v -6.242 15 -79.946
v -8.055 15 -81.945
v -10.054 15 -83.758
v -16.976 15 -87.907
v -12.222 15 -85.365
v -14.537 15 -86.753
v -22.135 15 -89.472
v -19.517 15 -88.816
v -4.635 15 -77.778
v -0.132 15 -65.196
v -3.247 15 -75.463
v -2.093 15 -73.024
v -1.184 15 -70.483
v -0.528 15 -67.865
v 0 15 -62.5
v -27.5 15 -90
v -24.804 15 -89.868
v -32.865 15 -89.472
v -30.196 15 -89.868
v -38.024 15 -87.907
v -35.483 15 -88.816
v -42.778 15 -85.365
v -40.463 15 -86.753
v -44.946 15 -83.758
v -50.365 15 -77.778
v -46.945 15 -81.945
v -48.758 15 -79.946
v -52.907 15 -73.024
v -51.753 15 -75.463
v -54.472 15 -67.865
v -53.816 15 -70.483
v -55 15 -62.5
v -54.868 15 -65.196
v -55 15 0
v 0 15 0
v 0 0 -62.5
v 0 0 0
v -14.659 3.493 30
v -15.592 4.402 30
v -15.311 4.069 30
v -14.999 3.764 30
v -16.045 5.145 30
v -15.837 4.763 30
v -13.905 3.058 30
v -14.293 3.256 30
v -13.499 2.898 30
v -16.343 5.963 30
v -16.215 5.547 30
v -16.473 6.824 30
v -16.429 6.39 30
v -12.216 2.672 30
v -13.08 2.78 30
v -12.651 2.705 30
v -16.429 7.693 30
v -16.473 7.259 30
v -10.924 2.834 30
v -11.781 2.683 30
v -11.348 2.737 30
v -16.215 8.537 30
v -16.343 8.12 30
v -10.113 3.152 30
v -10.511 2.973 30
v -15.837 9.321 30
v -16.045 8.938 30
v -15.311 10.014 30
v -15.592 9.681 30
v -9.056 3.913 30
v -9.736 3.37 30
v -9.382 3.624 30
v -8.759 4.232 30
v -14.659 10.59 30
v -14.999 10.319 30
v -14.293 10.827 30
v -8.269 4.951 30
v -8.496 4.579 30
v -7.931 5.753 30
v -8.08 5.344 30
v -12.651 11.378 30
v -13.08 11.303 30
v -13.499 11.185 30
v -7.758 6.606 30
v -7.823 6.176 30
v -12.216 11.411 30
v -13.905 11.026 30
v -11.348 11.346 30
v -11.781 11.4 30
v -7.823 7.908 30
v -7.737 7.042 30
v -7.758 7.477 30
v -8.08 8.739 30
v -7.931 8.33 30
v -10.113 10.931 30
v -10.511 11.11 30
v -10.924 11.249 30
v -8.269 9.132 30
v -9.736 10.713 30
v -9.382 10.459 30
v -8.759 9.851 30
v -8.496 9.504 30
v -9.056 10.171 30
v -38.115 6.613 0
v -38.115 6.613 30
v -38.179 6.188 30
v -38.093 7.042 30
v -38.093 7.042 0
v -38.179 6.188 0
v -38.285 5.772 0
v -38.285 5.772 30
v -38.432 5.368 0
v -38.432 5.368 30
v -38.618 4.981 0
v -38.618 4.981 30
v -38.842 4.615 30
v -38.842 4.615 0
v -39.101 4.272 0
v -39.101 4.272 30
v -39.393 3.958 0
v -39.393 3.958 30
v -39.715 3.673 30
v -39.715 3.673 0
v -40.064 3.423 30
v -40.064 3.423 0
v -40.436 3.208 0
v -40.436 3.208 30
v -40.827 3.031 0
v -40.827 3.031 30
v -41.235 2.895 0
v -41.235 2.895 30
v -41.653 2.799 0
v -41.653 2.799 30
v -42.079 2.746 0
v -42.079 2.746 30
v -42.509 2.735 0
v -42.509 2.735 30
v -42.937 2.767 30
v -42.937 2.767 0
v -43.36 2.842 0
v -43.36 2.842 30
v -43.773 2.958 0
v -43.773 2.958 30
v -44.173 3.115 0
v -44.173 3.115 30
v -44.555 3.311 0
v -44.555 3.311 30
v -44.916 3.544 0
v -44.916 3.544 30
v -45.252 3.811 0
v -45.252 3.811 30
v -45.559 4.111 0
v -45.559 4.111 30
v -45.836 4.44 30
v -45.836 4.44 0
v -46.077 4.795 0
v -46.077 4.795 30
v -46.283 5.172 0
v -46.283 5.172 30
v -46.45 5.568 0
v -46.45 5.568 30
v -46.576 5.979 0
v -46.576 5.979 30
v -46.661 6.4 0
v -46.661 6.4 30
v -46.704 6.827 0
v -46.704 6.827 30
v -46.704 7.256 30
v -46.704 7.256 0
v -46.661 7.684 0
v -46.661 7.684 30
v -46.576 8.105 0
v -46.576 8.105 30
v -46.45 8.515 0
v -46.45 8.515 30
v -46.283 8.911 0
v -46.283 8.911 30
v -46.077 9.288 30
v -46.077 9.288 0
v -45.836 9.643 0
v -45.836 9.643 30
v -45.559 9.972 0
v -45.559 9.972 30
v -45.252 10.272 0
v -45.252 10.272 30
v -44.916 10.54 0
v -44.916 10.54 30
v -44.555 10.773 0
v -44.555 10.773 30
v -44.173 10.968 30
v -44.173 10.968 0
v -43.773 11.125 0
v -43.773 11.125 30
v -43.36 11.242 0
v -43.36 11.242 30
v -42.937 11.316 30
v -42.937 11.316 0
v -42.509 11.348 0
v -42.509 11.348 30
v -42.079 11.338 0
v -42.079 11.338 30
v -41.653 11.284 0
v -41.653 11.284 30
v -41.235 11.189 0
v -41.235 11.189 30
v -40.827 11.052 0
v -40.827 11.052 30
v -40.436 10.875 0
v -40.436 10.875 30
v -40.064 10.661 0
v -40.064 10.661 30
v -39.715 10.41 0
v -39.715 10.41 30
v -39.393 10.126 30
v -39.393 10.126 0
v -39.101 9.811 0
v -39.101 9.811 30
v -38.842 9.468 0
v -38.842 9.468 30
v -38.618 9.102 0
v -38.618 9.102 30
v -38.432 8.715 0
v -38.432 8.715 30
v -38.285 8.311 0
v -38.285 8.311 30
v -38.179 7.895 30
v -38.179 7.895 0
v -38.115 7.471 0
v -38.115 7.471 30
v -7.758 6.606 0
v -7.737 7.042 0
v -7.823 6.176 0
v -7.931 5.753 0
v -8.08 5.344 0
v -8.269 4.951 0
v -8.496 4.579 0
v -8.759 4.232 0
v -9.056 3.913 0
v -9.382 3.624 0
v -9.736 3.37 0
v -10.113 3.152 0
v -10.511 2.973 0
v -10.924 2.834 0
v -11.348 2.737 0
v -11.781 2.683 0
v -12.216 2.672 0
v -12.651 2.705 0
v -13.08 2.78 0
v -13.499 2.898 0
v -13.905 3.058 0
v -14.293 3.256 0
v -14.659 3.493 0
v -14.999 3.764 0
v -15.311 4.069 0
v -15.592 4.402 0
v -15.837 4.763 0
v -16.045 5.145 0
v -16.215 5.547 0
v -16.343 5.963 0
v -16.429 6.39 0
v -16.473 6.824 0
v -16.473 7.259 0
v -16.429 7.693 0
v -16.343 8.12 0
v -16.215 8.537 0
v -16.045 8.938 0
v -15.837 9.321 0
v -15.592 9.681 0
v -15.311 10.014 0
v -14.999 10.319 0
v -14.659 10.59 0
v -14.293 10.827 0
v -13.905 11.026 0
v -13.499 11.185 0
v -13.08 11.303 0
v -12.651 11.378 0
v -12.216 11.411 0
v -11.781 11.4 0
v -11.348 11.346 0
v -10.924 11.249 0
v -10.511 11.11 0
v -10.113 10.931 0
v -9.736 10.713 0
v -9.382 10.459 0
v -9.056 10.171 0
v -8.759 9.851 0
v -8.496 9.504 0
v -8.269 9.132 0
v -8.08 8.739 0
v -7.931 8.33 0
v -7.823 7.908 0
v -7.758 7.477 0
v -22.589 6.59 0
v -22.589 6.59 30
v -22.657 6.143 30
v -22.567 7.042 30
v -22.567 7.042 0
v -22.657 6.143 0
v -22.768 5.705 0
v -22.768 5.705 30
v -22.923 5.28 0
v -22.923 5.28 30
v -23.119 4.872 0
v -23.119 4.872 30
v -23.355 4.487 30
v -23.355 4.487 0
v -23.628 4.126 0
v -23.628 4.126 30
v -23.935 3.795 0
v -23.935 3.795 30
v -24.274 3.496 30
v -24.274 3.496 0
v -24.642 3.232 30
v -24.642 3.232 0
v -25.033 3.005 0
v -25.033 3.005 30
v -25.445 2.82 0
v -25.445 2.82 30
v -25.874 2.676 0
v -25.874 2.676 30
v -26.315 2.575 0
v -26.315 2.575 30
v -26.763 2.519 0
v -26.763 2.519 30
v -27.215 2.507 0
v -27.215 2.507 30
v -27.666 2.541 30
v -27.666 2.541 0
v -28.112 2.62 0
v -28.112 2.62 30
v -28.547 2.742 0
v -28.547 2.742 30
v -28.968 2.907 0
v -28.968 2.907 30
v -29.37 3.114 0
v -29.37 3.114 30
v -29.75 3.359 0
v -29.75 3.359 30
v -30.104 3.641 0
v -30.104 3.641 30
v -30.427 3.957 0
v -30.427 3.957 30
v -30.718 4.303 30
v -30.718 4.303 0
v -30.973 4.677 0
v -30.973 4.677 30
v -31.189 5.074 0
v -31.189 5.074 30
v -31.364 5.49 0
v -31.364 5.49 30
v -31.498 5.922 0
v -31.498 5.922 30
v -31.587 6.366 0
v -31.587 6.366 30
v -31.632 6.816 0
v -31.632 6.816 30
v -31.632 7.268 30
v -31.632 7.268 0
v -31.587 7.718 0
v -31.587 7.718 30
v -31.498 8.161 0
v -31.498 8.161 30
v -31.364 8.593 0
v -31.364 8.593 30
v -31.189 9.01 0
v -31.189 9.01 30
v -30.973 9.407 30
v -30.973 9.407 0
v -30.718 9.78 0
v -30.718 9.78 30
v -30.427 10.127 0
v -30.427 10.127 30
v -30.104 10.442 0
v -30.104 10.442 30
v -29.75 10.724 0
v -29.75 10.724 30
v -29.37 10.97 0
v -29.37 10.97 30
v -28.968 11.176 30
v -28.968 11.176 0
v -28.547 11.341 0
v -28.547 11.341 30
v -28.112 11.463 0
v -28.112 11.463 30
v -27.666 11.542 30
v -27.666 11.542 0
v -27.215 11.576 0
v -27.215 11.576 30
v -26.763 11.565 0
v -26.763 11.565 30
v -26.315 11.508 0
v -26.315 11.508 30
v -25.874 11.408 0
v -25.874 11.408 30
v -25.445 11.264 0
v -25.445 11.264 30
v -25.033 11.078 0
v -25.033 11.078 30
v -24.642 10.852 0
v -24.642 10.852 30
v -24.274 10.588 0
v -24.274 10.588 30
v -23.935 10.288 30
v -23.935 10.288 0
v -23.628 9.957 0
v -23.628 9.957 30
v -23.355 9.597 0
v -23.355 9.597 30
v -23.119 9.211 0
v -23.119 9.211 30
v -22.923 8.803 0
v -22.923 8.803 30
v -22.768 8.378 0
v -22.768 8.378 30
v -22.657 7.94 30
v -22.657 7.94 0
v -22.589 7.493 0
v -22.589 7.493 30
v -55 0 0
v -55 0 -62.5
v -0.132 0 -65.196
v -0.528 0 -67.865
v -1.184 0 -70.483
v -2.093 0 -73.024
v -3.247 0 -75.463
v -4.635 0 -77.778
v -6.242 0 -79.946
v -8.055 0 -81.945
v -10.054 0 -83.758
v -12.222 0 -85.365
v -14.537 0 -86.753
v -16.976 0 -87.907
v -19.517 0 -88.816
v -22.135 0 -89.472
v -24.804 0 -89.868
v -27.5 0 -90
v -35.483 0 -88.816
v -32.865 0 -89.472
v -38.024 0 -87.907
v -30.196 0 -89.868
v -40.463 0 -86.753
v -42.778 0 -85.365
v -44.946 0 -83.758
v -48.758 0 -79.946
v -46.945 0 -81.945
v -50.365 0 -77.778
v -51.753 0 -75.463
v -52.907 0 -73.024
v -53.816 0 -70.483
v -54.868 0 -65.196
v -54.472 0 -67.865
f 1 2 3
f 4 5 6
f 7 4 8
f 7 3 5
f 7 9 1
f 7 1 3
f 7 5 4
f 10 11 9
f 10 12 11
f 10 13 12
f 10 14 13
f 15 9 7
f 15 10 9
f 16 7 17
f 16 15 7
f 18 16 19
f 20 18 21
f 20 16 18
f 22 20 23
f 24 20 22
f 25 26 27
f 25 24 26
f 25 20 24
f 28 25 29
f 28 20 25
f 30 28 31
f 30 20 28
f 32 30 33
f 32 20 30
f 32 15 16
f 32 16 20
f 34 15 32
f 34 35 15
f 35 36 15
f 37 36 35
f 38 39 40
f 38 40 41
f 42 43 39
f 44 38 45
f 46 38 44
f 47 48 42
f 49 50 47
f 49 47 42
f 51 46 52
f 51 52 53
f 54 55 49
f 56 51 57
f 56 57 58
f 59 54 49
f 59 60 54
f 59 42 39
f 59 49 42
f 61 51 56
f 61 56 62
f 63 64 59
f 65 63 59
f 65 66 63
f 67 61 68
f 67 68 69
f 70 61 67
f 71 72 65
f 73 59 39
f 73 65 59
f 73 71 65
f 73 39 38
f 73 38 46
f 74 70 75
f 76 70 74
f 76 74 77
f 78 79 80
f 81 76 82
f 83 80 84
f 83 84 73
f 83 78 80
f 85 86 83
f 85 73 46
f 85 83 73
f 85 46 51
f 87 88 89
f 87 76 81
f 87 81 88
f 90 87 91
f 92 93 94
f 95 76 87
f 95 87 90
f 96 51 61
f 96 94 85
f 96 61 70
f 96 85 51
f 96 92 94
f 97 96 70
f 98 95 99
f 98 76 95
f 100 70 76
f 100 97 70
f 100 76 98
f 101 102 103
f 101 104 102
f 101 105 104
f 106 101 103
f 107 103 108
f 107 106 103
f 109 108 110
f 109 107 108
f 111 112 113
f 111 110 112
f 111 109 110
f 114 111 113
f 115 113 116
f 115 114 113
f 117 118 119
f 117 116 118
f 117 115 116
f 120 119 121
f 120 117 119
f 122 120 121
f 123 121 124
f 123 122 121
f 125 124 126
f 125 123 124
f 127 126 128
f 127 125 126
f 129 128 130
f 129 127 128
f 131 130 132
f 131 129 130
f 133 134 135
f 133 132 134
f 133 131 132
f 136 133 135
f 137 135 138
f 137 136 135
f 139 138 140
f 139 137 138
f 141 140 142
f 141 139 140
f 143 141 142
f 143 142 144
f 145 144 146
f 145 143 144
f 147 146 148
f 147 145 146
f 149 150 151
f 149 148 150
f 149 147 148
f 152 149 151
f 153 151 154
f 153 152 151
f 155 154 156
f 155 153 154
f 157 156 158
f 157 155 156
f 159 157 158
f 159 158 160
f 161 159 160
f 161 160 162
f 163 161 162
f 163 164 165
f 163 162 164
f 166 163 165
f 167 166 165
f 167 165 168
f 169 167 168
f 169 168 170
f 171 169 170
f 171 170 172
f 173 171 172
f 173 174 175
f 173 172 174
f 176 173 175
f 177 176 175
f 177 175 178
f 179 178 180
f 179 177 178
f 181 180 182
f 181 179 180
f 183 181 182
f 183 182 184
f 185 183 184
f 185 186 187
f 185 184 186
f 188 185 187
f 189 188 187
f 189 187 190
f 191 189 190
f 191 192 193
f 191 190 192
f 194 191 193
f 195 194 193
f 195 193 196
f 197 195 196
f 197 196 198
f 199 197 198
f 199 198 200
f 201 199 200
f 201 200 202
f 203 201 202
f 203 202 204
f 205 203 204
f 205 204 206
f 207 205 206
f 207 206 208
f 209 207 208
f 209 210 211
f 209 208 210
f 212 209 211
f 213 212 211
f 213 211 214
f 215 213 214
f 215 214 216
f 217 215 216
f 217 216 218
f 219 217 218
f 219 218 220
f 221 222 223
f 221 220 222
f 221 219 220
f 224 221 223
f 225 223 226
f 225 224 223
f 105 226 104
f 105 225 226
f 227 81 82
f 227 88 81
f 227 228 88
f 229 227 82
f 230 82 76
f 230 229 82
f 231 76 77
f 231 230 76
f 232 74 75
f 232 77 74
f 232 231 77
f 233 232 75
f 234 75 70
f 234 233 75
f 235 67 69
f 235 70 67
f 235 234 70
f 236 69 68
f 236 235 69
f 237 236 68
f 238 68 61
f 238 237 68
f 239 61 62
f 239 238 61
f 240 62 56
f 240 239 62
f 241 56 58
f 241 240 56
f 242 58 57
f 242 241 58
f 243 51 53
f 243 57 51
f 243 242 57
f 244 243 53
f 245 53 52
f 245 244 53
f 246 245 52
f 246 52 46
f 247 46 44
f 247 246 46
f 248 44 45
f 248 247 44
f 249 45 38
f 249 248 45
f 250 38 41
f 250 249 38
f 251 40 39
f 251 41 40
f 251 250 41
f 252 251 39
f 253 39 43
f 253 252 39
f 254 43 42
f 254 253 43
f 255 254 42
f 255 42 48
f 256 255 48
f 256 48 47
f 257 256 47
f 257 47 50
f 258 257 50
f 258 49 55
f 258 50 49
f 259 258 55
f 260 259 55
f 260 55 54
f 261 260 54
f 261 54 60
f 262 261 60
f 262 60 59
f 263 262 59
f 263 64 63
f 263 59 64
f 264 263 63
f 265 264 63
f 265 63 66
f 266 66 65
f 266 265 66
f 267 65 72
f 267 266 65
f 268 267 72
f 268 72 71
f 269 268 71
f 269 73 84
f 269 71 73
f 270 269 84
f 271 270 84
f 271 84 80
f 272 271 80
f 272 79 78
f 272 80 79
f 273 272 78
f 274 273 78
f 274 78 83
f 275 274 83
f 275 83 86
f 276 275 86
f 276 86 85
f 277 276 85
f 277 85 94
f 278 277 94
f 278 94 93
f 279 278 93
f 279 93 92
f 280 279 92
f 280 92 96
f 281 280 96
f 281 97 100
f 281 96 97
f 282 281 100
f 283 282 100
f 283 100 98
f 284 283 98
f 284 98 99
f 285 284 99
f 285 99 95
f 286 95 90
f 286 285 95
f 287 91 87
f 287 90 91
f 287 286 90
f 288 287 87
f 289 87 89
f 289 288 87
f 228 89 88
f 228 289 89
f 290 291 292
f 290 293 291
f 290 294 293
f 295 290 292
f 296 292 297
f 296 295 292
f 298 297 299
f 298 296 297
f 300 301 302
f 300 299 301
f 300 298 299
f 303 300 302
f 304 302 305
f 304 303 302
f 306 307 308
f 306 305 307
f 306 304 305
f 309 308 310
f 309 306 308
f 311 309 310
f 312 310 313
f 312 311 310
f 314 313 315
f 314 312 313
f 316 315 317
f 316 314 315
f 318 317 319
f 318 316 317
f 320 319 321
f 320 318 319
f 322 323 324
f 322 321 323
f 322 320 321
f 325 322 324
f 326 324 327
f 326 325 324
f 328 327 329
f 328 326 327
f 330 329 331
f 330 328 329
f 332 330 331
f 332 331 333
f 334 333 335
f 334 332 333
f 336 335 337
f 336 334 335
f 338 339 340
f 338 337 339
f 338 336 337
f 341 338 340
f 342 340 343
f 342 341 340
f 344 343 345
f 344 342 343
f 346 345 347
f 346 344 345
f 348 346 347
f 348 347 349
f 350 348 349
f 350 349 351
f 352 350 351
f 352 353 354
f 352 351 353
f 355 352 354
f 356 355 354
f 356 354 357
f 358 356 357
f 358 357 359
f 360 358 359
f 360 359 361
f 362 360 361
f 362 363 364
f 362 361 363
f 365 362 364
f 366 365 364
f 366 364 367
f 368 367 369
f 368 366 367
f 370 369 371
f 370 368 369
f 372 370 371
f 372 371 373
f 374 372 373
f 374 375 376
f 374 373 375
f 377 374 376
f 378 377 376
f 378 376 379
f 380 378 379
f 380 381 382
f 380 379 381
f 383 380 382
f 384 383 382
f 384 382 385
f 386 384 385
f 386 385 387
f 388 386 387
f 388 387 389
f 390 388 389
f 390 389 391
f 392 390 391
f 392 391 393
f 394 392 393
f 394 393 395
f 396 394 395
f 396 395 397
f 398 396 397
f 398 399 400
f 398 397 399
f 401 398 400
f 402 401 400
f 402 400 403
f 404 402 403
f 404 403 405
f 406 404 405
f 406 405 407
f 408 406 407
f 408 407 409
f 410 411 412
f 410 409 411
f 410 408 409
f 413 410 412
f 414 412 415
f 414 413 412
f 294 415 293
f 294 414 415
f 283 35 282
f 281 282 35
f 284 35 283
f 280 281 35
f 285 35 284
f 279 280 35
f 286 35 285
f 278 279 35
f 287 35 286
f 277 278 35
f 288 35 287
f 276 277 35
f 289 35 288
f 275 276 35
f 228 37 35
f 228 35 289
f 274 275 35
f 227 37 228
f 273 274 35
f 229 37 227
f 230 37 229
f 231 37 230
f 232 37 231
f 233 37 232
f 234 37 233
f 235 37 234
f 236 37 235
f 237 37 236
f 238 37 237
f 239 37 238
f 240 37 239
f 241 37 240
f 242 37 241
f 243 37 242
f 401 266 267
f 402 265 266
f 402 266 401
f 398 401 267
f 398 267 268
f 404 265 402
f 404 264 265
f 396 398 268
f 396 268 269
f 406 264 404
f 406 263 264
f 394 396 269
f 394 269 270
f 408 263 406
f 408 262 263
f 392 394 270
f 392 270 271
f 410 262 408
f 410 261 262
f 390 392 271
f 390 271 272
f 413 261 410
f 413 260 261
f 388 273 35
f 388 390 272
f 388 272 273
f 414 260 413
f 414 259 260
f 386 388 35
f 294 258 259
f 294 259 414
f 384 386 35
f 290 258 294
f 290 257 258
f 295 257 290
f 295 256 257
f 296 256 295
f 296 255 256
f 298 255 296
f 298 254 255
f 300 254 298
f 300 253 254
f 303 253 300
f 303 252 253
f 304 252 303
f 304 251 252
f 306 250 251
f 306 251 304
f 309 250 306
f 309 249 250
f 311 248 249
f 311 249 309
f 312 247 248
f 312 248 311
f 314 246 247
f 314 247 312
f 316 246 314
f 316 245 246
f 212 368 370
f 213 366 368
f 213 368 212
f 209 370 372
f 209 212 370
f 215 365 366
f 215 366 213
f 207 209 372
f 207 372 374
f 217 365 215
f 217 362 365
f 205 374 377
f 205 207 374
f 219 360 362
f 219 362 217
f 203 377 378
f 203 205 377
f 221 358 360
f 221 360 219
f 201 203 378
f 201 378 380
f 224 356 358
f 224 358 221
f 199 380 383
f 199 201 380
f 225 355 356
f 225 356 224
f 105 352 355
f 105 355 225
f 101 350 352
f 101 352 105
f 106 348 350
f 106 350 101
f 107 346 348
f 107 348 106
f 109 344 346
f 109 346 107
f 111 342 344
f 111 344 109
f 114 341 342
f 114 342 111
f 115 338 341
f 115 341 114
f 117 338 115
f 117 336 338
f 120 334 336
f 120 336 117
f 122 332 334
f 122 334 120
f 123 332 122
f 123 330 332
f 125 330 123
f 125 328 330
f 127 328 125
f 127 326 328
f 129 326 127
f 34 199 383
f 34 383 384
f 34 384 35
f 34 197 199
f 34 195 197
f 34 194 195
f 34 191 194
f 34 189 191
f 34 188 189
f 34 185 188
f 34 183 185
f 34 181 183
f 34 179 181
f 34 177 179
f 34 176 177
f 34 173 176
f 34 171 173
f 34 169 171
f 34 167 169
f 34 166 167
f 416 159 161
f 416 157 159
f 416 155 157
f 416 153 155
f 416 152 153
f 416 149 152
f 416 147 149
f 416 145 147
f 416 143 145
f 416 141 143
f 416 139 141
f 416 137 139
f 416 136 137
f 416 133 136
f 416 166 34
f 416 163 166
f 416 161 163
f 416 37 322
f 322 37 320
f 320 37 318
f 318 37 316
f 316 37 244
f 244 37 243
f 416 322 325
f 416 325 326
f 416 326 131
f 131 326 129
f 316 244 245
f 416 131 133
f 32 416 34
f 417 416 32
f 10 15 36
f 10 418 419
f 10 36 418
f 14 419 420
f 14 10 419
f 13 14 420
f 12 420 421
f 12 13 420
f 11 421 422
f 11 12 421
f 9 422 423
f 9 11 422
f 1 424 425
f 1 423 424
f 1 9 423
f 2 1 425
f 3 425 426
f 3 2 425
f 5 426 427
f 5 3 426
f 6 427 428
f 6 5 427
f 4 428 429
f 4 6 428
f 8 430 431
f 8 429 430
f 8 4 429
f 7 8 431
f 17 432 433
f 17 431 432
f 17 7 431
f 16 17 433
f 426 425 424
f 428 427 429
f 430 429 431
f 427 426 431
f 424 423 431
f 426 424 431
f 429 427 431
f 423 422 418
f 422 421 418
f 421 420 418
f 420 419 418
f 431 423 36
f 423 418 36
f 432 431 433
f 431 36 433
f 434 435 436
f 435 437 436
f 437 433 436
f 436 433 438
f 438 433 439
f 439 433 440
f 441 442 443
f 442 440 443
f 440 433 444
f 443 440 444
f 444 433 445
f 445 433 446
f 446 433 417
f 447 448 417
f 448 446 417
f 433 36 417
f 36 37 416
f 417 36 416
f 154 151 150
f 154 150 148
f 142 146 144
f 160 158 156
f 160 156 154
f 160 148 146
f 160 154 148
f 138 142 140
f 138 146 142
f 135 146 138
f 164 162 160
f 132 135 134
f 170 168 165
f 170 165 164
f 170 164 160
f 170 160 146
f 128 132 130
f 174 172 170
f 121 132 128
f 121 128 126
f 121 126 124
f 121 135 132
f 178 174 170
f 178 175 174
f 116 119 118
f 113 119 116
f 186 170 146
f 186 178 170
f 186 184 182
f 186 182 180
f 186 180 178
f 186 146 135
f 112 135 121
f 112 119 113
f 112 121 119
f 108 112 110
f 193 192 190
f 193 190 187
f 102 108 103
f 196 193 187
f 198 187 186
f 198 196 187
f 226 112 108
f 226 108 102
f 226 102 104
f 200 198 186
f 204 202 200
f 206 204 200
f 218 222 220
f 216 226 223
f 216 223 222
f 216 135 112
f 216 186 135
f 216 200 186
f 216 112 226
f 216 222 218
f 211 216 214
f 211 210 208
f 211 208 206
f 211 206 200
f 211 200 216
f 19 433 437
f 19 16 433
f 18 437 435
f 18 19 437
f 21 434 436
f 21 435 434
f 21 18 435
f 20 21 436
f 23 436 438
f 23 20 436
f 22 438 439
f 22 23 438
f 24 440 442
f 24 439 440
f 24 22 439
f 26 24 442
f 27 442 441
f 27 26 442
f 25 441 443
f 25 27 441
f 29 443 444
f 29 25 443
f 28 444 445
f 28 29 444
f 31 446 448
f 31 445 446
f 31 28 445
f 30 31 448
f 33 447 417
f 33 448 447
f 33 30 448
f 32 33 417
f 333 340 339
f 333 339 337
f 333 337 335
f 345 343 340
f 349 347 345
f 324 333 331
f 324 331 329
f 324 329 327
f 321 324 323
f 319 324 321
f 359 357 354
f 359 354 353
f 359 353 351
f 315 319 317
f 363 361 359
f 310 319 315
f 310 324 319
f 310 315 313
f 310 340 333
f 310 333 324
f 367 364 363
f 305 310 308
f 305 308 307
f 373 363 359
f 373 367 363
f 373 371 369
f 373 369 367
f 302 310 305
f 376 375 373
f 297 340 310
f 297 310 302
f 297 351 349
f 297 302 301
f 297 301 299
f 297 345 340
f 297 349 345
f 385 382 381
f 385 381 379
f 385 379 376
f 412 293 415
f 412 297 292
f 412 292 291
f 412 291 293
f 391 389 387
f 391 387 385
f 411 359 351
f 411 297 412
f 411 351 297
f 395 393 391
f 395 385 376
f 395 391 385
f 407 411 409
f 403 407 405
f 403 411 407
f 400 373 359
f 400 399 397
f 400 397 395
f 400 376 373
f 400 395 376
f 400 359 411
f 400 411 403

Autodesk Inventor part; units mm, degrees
ref_plane "YZ Plane" through (0, 0, 0) normal (1, 0, 0) x (0, 1, 0)
ref_plane "XZ Plane" through (0, 0, 0) normal (0, 1, 0) x (-1, 0, 0)
ref_plane "XY Plane" through (0, 0, 0) normal (0, 0, 1) x (1, 0, 0)
sketch "Sketch1" plane through (0, 0, 0) normal (0, 1, 0) x (-1, 0, 0)
  line L0 (0, 0) -> (55, 0)
  line L1 (55, 0) -> (55, -90)
  line L2 (55, -90) -> (0, -90)
  line L3 (0, -90) -> (0, 0)
  dimension "d0" = 90
  dimension "d1" = 55
extrude "Extrusion1" add sketch "Sketch1" along normal blind 15
full round fillet "Fillet1" first side at (0, 5, -30) centre faces at (-18.3333, 5, -90) second side at (-55, 5, -60)
sketch "Sketch2" plane through (-55, 0, 0) normal (0, 0, 1) x (1, 0, 0)
  circle A0 centre (12.5986, 7.0416) radius 4.3081
  circle A1 centre (27.8976, 7.0416) radius 4.5356
  circle A2 centre (42.8926, 7.0416) radius 4.3708
  point P0 (55, 0)
extrude "Extrusion2" add sketch "Sketch2" along normal blind 30
sketch "Sketch3" plane through (0, 15, 0) normal (0, 1, 0) x (1, 0, 0)
  line L0 (-48.594, 65.8616) -> (-7.6272, 65.8616) construction
  line L1 (-7.6272, 65.8616) -> (-7.6272, 56.4823) construction
  line L2 (-7.6272, 56.4823) -> (-48.594, 56.4823) construction
  line L3 (-48.594, 56.4823) -> (-48.594, 65.8616) construction
  point P0 (0, 0)
  dimension "d2" = 15
  dimension "d3" = 0
properties part number "tmp 36 now"
